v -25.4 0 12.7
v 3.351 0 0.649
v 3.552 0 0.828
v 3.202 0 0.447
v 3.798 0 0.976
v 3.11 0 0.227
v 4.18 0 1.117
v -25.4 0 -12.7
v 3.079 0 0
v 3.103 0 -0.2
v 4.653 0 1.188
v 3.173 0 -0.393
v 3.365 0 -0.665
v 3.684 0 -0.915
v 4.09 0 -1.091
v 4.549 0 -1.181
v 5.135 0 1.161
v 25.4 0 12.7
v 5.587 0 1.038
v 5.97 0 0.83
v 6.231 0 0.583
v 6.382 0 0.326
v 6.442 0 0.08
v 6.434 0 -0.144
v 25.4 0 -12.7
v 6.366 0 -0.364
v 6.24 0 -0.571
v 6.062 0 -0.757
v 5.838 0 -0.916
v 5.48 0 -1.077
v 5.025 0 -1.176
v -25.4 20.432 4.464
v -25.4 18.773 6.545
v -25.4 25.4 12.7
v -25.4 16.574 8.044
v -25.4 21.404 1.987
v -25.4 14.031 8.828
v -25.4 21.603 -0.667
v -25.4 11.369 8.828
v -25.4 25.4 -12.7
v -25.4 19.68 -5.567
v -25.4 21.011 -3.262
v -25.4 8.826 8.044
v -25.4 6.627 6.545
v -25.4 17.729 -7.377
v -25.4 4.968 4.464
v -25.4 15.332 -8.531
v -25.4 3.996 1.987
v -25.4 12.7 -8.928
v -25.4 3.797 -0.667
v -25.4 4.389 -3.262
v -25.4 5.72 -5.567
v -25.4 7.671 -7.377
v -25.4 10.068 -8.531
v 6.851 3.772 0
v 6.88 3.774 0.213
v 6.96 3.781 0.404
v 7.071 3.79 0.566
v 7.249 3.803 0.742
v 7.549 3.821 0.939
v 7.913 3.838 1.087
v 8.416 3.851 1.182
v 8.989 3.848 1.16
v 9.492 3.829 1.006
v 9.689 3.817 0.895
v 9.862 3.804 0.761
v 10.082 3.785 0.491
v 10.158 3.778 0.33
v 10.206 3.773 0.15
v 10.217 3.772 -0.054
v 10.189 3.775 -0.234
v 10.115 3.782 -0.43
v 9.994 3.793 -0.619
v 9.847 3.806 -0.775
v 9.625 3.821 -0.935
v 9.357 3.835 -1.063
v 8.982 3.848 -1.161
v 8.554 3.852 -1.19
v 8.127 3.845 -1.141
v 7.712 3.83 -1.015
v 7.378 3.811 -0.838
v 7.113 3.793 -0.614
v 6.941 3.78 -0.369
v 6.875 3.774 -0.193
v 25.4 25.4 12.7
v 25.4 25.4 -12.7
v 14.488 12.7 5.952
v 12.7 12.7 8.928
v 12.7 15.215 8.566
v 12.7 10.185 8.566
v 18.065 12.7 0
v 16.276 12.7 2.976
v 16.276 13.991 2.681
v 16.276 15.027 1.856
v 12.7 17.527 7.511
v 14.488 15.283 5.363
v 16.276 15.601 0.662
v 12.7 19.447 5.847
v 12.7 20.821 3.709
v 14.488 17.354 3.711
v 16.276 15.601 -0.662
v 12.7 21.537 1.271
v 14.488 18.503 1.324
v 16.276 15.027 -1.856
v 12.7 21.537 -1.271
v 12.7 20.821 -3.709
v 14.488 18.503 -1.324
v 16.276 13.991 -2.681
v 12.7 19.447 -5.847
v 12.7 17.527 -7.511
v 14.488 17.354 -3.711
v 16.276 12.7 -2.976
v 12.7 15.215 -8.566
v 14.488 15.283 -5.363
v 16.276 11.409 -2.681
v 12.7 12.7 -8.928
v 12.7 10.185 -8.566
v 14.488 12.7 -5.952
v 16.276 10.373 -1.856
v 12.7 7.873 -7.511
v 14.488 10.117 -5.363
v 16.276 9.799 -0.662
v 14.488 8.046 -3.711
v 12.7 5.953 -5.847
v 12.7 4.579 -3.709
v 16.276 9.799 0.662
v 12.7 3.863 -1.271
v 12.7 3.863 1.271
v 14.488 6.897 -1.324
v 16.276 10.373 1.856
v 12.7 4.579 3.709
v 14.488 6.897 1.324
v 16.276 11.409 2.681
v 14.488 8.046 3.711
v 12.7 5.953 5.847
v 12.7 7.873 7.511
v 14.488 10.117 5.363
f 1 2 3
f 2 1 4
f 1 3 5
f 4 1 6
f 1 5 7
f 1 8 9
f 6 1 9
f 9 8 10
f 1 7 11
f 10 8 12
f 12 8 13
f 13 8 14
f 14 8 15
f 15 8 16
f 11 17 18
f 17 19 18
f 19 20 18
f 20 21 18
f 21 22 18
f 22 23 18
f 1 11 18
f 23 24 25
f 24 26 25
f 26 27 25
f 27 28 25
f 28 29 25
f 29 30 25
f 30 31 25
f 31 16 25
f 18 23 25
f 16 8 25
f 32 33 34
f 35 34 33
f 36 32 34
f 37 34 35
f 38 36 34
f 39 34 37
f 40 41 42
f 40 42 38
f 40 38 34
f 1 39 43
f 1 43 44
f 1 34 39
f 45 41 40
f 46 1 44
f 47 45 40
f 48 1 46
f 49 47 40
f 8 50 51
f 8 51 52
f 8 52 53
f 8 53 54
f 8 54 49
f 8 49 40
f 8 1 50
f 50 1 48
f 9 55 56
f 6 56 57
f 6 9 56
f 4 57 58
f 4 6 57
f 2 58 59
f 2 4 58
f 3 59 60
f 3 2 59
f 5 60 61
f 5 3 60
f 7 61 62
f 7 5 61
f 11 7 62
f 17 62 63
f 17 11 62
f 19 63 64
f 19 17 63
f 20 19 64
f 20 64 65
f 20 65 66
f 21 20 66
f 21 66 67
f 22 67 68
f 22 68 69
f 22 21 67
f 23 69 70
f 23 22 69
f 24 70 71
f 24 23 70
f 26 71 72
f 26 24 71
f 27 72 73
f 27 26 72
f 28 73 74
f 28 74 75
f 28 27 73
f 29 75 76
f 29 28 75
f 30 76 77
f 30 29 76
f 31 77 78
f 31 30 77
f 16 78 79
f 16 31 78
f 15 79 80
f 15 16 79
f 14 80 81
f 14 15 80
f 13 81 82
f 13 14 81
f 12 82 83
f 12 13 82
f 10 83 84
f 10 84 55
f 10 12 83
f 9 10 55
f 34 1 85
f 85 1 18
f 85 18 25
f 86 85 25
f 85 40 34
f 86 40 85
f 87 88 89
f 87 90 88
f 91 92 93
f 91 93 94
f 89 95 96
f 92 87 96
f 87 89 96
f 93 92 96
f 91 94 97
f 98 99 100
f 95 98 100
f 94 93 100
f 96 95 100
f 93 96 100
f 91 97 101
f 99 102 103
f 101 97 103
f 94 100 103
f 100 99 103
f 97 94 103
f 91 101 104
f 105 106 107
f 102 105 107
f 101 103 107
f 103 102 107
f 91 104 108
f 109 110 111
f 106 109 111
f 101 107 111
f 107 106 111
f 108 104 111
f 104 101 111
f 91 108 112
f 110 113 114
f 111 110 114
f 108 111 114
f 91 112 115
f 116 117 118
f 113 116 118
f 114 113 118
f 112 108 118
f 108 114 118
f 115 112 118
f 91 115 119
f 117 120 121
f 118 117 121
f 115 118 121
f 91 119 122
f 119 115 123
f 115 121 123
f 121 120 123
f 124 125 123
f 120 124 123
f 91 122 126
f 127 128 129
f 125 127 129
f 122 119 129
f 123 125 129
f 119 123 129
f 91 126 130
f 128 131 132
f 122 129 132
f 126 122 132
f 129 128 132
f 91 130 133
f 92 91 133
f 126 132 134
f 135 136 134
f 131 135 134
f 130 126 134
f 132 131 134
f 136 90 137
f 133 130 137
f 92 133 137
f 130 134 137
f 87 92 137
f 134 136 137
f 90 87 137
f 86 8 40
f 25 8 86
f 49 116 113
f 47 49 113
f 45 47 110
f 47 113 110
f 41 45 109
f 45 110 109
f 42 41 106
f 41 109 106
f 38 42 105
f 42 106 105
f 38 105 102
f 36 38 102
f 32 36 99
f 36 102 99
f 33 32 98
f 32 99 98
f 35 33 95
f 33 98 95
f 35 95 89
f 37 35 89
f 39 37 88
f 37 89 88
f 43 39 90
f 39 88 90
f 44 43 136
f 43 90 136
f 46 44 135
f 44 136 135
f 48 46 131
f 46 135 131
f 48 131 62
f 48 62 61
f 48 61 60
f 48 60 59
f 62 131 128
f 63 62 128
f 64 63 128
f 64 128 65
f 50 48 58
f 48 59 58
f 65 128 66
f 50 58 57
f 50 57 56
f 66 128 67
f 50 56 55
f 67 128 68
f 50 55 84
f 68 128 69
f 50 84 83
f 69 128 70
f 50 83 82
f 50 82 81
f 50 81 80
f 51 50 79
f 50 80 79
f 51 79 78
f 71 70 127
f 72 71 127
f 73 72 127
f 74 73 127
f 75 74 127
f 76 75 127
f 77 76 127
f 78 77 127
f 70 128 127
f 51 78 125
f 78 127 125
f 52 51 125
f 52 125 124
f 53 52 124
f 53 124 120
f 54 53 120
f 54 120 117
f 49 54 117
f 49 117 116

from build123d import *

# Parameters (mm, degrees)
SKETCH1_W                         = 50.8
SKETCH1_H                         = 25.4
BOSS_EXTRUDE1_DEPTH               = 25.4
PIPE_TAP_DRILL_FOR_1_2_TAP1_D     = 17.8562
PIPE_TAP_DRILL_FOR_1_2_TAP1_DEPTH = 38.1
PIPE_TAP_DRILL_FOR_1_2_TAP1_TIP   = 5.364543693


with BuildPart() as part:
    # Sketch1 → Boss-Extrude1 (new body)
    with BuildSketch(Plane(origin=(0, 0, 0), x_dir=(1, 0, 0), z_dir=(0, 1, 0))):
        Rectangle(SKETCH1_W, SKETCH1_H)
    extrude(amount=BOSS_EXTRUDE1_DEPTH)

    # Pipe Tap Drill for 1/2 Tap1
    with Locations(Plane.ZY.offset(25.4)):
        with Locations((0, 12.7)):
            Hole(PIPE_TAP_DRILL_FOR_1_2_TAP1_D / 2, depth=PIPE_TAP_DRILL_FOR_1_2_TAP1_DEPTH)
            with Locations((0, 0, -(PIPE_TAP_DRILL_FOR_1_2_TAP1_DEPTH + PIPE_TAP_DRILL_FOR_1_2_TAP1_TIP / 2))):  # 118° drill point
                Cone(0, PIPE_TAP_DRILL_FOR_1_2_TAP1_D / 2, PIPE_TAP_DRILL_FOR_1_2_TAP1_TIP, mode=Mode.SUBTRACT)

    # Sketch5 → Cut-Revolve2 (revolve, cut)
    with BuildSketch(Plane.XY):
        Polygon((-12.7, -10.766878787), (-9.352189393, -14.114689393), (11.954399011, 7.191899011), (11.1125, 8.033798023), (-0.841899011, -3.920600989), align=None)
    revolve(axis=Axis((-9.352189393, -14.114689393, 0), (0.707106781, 0.707106781, 0)), mode=Mode.SUBTRACT)


solid = part.part
